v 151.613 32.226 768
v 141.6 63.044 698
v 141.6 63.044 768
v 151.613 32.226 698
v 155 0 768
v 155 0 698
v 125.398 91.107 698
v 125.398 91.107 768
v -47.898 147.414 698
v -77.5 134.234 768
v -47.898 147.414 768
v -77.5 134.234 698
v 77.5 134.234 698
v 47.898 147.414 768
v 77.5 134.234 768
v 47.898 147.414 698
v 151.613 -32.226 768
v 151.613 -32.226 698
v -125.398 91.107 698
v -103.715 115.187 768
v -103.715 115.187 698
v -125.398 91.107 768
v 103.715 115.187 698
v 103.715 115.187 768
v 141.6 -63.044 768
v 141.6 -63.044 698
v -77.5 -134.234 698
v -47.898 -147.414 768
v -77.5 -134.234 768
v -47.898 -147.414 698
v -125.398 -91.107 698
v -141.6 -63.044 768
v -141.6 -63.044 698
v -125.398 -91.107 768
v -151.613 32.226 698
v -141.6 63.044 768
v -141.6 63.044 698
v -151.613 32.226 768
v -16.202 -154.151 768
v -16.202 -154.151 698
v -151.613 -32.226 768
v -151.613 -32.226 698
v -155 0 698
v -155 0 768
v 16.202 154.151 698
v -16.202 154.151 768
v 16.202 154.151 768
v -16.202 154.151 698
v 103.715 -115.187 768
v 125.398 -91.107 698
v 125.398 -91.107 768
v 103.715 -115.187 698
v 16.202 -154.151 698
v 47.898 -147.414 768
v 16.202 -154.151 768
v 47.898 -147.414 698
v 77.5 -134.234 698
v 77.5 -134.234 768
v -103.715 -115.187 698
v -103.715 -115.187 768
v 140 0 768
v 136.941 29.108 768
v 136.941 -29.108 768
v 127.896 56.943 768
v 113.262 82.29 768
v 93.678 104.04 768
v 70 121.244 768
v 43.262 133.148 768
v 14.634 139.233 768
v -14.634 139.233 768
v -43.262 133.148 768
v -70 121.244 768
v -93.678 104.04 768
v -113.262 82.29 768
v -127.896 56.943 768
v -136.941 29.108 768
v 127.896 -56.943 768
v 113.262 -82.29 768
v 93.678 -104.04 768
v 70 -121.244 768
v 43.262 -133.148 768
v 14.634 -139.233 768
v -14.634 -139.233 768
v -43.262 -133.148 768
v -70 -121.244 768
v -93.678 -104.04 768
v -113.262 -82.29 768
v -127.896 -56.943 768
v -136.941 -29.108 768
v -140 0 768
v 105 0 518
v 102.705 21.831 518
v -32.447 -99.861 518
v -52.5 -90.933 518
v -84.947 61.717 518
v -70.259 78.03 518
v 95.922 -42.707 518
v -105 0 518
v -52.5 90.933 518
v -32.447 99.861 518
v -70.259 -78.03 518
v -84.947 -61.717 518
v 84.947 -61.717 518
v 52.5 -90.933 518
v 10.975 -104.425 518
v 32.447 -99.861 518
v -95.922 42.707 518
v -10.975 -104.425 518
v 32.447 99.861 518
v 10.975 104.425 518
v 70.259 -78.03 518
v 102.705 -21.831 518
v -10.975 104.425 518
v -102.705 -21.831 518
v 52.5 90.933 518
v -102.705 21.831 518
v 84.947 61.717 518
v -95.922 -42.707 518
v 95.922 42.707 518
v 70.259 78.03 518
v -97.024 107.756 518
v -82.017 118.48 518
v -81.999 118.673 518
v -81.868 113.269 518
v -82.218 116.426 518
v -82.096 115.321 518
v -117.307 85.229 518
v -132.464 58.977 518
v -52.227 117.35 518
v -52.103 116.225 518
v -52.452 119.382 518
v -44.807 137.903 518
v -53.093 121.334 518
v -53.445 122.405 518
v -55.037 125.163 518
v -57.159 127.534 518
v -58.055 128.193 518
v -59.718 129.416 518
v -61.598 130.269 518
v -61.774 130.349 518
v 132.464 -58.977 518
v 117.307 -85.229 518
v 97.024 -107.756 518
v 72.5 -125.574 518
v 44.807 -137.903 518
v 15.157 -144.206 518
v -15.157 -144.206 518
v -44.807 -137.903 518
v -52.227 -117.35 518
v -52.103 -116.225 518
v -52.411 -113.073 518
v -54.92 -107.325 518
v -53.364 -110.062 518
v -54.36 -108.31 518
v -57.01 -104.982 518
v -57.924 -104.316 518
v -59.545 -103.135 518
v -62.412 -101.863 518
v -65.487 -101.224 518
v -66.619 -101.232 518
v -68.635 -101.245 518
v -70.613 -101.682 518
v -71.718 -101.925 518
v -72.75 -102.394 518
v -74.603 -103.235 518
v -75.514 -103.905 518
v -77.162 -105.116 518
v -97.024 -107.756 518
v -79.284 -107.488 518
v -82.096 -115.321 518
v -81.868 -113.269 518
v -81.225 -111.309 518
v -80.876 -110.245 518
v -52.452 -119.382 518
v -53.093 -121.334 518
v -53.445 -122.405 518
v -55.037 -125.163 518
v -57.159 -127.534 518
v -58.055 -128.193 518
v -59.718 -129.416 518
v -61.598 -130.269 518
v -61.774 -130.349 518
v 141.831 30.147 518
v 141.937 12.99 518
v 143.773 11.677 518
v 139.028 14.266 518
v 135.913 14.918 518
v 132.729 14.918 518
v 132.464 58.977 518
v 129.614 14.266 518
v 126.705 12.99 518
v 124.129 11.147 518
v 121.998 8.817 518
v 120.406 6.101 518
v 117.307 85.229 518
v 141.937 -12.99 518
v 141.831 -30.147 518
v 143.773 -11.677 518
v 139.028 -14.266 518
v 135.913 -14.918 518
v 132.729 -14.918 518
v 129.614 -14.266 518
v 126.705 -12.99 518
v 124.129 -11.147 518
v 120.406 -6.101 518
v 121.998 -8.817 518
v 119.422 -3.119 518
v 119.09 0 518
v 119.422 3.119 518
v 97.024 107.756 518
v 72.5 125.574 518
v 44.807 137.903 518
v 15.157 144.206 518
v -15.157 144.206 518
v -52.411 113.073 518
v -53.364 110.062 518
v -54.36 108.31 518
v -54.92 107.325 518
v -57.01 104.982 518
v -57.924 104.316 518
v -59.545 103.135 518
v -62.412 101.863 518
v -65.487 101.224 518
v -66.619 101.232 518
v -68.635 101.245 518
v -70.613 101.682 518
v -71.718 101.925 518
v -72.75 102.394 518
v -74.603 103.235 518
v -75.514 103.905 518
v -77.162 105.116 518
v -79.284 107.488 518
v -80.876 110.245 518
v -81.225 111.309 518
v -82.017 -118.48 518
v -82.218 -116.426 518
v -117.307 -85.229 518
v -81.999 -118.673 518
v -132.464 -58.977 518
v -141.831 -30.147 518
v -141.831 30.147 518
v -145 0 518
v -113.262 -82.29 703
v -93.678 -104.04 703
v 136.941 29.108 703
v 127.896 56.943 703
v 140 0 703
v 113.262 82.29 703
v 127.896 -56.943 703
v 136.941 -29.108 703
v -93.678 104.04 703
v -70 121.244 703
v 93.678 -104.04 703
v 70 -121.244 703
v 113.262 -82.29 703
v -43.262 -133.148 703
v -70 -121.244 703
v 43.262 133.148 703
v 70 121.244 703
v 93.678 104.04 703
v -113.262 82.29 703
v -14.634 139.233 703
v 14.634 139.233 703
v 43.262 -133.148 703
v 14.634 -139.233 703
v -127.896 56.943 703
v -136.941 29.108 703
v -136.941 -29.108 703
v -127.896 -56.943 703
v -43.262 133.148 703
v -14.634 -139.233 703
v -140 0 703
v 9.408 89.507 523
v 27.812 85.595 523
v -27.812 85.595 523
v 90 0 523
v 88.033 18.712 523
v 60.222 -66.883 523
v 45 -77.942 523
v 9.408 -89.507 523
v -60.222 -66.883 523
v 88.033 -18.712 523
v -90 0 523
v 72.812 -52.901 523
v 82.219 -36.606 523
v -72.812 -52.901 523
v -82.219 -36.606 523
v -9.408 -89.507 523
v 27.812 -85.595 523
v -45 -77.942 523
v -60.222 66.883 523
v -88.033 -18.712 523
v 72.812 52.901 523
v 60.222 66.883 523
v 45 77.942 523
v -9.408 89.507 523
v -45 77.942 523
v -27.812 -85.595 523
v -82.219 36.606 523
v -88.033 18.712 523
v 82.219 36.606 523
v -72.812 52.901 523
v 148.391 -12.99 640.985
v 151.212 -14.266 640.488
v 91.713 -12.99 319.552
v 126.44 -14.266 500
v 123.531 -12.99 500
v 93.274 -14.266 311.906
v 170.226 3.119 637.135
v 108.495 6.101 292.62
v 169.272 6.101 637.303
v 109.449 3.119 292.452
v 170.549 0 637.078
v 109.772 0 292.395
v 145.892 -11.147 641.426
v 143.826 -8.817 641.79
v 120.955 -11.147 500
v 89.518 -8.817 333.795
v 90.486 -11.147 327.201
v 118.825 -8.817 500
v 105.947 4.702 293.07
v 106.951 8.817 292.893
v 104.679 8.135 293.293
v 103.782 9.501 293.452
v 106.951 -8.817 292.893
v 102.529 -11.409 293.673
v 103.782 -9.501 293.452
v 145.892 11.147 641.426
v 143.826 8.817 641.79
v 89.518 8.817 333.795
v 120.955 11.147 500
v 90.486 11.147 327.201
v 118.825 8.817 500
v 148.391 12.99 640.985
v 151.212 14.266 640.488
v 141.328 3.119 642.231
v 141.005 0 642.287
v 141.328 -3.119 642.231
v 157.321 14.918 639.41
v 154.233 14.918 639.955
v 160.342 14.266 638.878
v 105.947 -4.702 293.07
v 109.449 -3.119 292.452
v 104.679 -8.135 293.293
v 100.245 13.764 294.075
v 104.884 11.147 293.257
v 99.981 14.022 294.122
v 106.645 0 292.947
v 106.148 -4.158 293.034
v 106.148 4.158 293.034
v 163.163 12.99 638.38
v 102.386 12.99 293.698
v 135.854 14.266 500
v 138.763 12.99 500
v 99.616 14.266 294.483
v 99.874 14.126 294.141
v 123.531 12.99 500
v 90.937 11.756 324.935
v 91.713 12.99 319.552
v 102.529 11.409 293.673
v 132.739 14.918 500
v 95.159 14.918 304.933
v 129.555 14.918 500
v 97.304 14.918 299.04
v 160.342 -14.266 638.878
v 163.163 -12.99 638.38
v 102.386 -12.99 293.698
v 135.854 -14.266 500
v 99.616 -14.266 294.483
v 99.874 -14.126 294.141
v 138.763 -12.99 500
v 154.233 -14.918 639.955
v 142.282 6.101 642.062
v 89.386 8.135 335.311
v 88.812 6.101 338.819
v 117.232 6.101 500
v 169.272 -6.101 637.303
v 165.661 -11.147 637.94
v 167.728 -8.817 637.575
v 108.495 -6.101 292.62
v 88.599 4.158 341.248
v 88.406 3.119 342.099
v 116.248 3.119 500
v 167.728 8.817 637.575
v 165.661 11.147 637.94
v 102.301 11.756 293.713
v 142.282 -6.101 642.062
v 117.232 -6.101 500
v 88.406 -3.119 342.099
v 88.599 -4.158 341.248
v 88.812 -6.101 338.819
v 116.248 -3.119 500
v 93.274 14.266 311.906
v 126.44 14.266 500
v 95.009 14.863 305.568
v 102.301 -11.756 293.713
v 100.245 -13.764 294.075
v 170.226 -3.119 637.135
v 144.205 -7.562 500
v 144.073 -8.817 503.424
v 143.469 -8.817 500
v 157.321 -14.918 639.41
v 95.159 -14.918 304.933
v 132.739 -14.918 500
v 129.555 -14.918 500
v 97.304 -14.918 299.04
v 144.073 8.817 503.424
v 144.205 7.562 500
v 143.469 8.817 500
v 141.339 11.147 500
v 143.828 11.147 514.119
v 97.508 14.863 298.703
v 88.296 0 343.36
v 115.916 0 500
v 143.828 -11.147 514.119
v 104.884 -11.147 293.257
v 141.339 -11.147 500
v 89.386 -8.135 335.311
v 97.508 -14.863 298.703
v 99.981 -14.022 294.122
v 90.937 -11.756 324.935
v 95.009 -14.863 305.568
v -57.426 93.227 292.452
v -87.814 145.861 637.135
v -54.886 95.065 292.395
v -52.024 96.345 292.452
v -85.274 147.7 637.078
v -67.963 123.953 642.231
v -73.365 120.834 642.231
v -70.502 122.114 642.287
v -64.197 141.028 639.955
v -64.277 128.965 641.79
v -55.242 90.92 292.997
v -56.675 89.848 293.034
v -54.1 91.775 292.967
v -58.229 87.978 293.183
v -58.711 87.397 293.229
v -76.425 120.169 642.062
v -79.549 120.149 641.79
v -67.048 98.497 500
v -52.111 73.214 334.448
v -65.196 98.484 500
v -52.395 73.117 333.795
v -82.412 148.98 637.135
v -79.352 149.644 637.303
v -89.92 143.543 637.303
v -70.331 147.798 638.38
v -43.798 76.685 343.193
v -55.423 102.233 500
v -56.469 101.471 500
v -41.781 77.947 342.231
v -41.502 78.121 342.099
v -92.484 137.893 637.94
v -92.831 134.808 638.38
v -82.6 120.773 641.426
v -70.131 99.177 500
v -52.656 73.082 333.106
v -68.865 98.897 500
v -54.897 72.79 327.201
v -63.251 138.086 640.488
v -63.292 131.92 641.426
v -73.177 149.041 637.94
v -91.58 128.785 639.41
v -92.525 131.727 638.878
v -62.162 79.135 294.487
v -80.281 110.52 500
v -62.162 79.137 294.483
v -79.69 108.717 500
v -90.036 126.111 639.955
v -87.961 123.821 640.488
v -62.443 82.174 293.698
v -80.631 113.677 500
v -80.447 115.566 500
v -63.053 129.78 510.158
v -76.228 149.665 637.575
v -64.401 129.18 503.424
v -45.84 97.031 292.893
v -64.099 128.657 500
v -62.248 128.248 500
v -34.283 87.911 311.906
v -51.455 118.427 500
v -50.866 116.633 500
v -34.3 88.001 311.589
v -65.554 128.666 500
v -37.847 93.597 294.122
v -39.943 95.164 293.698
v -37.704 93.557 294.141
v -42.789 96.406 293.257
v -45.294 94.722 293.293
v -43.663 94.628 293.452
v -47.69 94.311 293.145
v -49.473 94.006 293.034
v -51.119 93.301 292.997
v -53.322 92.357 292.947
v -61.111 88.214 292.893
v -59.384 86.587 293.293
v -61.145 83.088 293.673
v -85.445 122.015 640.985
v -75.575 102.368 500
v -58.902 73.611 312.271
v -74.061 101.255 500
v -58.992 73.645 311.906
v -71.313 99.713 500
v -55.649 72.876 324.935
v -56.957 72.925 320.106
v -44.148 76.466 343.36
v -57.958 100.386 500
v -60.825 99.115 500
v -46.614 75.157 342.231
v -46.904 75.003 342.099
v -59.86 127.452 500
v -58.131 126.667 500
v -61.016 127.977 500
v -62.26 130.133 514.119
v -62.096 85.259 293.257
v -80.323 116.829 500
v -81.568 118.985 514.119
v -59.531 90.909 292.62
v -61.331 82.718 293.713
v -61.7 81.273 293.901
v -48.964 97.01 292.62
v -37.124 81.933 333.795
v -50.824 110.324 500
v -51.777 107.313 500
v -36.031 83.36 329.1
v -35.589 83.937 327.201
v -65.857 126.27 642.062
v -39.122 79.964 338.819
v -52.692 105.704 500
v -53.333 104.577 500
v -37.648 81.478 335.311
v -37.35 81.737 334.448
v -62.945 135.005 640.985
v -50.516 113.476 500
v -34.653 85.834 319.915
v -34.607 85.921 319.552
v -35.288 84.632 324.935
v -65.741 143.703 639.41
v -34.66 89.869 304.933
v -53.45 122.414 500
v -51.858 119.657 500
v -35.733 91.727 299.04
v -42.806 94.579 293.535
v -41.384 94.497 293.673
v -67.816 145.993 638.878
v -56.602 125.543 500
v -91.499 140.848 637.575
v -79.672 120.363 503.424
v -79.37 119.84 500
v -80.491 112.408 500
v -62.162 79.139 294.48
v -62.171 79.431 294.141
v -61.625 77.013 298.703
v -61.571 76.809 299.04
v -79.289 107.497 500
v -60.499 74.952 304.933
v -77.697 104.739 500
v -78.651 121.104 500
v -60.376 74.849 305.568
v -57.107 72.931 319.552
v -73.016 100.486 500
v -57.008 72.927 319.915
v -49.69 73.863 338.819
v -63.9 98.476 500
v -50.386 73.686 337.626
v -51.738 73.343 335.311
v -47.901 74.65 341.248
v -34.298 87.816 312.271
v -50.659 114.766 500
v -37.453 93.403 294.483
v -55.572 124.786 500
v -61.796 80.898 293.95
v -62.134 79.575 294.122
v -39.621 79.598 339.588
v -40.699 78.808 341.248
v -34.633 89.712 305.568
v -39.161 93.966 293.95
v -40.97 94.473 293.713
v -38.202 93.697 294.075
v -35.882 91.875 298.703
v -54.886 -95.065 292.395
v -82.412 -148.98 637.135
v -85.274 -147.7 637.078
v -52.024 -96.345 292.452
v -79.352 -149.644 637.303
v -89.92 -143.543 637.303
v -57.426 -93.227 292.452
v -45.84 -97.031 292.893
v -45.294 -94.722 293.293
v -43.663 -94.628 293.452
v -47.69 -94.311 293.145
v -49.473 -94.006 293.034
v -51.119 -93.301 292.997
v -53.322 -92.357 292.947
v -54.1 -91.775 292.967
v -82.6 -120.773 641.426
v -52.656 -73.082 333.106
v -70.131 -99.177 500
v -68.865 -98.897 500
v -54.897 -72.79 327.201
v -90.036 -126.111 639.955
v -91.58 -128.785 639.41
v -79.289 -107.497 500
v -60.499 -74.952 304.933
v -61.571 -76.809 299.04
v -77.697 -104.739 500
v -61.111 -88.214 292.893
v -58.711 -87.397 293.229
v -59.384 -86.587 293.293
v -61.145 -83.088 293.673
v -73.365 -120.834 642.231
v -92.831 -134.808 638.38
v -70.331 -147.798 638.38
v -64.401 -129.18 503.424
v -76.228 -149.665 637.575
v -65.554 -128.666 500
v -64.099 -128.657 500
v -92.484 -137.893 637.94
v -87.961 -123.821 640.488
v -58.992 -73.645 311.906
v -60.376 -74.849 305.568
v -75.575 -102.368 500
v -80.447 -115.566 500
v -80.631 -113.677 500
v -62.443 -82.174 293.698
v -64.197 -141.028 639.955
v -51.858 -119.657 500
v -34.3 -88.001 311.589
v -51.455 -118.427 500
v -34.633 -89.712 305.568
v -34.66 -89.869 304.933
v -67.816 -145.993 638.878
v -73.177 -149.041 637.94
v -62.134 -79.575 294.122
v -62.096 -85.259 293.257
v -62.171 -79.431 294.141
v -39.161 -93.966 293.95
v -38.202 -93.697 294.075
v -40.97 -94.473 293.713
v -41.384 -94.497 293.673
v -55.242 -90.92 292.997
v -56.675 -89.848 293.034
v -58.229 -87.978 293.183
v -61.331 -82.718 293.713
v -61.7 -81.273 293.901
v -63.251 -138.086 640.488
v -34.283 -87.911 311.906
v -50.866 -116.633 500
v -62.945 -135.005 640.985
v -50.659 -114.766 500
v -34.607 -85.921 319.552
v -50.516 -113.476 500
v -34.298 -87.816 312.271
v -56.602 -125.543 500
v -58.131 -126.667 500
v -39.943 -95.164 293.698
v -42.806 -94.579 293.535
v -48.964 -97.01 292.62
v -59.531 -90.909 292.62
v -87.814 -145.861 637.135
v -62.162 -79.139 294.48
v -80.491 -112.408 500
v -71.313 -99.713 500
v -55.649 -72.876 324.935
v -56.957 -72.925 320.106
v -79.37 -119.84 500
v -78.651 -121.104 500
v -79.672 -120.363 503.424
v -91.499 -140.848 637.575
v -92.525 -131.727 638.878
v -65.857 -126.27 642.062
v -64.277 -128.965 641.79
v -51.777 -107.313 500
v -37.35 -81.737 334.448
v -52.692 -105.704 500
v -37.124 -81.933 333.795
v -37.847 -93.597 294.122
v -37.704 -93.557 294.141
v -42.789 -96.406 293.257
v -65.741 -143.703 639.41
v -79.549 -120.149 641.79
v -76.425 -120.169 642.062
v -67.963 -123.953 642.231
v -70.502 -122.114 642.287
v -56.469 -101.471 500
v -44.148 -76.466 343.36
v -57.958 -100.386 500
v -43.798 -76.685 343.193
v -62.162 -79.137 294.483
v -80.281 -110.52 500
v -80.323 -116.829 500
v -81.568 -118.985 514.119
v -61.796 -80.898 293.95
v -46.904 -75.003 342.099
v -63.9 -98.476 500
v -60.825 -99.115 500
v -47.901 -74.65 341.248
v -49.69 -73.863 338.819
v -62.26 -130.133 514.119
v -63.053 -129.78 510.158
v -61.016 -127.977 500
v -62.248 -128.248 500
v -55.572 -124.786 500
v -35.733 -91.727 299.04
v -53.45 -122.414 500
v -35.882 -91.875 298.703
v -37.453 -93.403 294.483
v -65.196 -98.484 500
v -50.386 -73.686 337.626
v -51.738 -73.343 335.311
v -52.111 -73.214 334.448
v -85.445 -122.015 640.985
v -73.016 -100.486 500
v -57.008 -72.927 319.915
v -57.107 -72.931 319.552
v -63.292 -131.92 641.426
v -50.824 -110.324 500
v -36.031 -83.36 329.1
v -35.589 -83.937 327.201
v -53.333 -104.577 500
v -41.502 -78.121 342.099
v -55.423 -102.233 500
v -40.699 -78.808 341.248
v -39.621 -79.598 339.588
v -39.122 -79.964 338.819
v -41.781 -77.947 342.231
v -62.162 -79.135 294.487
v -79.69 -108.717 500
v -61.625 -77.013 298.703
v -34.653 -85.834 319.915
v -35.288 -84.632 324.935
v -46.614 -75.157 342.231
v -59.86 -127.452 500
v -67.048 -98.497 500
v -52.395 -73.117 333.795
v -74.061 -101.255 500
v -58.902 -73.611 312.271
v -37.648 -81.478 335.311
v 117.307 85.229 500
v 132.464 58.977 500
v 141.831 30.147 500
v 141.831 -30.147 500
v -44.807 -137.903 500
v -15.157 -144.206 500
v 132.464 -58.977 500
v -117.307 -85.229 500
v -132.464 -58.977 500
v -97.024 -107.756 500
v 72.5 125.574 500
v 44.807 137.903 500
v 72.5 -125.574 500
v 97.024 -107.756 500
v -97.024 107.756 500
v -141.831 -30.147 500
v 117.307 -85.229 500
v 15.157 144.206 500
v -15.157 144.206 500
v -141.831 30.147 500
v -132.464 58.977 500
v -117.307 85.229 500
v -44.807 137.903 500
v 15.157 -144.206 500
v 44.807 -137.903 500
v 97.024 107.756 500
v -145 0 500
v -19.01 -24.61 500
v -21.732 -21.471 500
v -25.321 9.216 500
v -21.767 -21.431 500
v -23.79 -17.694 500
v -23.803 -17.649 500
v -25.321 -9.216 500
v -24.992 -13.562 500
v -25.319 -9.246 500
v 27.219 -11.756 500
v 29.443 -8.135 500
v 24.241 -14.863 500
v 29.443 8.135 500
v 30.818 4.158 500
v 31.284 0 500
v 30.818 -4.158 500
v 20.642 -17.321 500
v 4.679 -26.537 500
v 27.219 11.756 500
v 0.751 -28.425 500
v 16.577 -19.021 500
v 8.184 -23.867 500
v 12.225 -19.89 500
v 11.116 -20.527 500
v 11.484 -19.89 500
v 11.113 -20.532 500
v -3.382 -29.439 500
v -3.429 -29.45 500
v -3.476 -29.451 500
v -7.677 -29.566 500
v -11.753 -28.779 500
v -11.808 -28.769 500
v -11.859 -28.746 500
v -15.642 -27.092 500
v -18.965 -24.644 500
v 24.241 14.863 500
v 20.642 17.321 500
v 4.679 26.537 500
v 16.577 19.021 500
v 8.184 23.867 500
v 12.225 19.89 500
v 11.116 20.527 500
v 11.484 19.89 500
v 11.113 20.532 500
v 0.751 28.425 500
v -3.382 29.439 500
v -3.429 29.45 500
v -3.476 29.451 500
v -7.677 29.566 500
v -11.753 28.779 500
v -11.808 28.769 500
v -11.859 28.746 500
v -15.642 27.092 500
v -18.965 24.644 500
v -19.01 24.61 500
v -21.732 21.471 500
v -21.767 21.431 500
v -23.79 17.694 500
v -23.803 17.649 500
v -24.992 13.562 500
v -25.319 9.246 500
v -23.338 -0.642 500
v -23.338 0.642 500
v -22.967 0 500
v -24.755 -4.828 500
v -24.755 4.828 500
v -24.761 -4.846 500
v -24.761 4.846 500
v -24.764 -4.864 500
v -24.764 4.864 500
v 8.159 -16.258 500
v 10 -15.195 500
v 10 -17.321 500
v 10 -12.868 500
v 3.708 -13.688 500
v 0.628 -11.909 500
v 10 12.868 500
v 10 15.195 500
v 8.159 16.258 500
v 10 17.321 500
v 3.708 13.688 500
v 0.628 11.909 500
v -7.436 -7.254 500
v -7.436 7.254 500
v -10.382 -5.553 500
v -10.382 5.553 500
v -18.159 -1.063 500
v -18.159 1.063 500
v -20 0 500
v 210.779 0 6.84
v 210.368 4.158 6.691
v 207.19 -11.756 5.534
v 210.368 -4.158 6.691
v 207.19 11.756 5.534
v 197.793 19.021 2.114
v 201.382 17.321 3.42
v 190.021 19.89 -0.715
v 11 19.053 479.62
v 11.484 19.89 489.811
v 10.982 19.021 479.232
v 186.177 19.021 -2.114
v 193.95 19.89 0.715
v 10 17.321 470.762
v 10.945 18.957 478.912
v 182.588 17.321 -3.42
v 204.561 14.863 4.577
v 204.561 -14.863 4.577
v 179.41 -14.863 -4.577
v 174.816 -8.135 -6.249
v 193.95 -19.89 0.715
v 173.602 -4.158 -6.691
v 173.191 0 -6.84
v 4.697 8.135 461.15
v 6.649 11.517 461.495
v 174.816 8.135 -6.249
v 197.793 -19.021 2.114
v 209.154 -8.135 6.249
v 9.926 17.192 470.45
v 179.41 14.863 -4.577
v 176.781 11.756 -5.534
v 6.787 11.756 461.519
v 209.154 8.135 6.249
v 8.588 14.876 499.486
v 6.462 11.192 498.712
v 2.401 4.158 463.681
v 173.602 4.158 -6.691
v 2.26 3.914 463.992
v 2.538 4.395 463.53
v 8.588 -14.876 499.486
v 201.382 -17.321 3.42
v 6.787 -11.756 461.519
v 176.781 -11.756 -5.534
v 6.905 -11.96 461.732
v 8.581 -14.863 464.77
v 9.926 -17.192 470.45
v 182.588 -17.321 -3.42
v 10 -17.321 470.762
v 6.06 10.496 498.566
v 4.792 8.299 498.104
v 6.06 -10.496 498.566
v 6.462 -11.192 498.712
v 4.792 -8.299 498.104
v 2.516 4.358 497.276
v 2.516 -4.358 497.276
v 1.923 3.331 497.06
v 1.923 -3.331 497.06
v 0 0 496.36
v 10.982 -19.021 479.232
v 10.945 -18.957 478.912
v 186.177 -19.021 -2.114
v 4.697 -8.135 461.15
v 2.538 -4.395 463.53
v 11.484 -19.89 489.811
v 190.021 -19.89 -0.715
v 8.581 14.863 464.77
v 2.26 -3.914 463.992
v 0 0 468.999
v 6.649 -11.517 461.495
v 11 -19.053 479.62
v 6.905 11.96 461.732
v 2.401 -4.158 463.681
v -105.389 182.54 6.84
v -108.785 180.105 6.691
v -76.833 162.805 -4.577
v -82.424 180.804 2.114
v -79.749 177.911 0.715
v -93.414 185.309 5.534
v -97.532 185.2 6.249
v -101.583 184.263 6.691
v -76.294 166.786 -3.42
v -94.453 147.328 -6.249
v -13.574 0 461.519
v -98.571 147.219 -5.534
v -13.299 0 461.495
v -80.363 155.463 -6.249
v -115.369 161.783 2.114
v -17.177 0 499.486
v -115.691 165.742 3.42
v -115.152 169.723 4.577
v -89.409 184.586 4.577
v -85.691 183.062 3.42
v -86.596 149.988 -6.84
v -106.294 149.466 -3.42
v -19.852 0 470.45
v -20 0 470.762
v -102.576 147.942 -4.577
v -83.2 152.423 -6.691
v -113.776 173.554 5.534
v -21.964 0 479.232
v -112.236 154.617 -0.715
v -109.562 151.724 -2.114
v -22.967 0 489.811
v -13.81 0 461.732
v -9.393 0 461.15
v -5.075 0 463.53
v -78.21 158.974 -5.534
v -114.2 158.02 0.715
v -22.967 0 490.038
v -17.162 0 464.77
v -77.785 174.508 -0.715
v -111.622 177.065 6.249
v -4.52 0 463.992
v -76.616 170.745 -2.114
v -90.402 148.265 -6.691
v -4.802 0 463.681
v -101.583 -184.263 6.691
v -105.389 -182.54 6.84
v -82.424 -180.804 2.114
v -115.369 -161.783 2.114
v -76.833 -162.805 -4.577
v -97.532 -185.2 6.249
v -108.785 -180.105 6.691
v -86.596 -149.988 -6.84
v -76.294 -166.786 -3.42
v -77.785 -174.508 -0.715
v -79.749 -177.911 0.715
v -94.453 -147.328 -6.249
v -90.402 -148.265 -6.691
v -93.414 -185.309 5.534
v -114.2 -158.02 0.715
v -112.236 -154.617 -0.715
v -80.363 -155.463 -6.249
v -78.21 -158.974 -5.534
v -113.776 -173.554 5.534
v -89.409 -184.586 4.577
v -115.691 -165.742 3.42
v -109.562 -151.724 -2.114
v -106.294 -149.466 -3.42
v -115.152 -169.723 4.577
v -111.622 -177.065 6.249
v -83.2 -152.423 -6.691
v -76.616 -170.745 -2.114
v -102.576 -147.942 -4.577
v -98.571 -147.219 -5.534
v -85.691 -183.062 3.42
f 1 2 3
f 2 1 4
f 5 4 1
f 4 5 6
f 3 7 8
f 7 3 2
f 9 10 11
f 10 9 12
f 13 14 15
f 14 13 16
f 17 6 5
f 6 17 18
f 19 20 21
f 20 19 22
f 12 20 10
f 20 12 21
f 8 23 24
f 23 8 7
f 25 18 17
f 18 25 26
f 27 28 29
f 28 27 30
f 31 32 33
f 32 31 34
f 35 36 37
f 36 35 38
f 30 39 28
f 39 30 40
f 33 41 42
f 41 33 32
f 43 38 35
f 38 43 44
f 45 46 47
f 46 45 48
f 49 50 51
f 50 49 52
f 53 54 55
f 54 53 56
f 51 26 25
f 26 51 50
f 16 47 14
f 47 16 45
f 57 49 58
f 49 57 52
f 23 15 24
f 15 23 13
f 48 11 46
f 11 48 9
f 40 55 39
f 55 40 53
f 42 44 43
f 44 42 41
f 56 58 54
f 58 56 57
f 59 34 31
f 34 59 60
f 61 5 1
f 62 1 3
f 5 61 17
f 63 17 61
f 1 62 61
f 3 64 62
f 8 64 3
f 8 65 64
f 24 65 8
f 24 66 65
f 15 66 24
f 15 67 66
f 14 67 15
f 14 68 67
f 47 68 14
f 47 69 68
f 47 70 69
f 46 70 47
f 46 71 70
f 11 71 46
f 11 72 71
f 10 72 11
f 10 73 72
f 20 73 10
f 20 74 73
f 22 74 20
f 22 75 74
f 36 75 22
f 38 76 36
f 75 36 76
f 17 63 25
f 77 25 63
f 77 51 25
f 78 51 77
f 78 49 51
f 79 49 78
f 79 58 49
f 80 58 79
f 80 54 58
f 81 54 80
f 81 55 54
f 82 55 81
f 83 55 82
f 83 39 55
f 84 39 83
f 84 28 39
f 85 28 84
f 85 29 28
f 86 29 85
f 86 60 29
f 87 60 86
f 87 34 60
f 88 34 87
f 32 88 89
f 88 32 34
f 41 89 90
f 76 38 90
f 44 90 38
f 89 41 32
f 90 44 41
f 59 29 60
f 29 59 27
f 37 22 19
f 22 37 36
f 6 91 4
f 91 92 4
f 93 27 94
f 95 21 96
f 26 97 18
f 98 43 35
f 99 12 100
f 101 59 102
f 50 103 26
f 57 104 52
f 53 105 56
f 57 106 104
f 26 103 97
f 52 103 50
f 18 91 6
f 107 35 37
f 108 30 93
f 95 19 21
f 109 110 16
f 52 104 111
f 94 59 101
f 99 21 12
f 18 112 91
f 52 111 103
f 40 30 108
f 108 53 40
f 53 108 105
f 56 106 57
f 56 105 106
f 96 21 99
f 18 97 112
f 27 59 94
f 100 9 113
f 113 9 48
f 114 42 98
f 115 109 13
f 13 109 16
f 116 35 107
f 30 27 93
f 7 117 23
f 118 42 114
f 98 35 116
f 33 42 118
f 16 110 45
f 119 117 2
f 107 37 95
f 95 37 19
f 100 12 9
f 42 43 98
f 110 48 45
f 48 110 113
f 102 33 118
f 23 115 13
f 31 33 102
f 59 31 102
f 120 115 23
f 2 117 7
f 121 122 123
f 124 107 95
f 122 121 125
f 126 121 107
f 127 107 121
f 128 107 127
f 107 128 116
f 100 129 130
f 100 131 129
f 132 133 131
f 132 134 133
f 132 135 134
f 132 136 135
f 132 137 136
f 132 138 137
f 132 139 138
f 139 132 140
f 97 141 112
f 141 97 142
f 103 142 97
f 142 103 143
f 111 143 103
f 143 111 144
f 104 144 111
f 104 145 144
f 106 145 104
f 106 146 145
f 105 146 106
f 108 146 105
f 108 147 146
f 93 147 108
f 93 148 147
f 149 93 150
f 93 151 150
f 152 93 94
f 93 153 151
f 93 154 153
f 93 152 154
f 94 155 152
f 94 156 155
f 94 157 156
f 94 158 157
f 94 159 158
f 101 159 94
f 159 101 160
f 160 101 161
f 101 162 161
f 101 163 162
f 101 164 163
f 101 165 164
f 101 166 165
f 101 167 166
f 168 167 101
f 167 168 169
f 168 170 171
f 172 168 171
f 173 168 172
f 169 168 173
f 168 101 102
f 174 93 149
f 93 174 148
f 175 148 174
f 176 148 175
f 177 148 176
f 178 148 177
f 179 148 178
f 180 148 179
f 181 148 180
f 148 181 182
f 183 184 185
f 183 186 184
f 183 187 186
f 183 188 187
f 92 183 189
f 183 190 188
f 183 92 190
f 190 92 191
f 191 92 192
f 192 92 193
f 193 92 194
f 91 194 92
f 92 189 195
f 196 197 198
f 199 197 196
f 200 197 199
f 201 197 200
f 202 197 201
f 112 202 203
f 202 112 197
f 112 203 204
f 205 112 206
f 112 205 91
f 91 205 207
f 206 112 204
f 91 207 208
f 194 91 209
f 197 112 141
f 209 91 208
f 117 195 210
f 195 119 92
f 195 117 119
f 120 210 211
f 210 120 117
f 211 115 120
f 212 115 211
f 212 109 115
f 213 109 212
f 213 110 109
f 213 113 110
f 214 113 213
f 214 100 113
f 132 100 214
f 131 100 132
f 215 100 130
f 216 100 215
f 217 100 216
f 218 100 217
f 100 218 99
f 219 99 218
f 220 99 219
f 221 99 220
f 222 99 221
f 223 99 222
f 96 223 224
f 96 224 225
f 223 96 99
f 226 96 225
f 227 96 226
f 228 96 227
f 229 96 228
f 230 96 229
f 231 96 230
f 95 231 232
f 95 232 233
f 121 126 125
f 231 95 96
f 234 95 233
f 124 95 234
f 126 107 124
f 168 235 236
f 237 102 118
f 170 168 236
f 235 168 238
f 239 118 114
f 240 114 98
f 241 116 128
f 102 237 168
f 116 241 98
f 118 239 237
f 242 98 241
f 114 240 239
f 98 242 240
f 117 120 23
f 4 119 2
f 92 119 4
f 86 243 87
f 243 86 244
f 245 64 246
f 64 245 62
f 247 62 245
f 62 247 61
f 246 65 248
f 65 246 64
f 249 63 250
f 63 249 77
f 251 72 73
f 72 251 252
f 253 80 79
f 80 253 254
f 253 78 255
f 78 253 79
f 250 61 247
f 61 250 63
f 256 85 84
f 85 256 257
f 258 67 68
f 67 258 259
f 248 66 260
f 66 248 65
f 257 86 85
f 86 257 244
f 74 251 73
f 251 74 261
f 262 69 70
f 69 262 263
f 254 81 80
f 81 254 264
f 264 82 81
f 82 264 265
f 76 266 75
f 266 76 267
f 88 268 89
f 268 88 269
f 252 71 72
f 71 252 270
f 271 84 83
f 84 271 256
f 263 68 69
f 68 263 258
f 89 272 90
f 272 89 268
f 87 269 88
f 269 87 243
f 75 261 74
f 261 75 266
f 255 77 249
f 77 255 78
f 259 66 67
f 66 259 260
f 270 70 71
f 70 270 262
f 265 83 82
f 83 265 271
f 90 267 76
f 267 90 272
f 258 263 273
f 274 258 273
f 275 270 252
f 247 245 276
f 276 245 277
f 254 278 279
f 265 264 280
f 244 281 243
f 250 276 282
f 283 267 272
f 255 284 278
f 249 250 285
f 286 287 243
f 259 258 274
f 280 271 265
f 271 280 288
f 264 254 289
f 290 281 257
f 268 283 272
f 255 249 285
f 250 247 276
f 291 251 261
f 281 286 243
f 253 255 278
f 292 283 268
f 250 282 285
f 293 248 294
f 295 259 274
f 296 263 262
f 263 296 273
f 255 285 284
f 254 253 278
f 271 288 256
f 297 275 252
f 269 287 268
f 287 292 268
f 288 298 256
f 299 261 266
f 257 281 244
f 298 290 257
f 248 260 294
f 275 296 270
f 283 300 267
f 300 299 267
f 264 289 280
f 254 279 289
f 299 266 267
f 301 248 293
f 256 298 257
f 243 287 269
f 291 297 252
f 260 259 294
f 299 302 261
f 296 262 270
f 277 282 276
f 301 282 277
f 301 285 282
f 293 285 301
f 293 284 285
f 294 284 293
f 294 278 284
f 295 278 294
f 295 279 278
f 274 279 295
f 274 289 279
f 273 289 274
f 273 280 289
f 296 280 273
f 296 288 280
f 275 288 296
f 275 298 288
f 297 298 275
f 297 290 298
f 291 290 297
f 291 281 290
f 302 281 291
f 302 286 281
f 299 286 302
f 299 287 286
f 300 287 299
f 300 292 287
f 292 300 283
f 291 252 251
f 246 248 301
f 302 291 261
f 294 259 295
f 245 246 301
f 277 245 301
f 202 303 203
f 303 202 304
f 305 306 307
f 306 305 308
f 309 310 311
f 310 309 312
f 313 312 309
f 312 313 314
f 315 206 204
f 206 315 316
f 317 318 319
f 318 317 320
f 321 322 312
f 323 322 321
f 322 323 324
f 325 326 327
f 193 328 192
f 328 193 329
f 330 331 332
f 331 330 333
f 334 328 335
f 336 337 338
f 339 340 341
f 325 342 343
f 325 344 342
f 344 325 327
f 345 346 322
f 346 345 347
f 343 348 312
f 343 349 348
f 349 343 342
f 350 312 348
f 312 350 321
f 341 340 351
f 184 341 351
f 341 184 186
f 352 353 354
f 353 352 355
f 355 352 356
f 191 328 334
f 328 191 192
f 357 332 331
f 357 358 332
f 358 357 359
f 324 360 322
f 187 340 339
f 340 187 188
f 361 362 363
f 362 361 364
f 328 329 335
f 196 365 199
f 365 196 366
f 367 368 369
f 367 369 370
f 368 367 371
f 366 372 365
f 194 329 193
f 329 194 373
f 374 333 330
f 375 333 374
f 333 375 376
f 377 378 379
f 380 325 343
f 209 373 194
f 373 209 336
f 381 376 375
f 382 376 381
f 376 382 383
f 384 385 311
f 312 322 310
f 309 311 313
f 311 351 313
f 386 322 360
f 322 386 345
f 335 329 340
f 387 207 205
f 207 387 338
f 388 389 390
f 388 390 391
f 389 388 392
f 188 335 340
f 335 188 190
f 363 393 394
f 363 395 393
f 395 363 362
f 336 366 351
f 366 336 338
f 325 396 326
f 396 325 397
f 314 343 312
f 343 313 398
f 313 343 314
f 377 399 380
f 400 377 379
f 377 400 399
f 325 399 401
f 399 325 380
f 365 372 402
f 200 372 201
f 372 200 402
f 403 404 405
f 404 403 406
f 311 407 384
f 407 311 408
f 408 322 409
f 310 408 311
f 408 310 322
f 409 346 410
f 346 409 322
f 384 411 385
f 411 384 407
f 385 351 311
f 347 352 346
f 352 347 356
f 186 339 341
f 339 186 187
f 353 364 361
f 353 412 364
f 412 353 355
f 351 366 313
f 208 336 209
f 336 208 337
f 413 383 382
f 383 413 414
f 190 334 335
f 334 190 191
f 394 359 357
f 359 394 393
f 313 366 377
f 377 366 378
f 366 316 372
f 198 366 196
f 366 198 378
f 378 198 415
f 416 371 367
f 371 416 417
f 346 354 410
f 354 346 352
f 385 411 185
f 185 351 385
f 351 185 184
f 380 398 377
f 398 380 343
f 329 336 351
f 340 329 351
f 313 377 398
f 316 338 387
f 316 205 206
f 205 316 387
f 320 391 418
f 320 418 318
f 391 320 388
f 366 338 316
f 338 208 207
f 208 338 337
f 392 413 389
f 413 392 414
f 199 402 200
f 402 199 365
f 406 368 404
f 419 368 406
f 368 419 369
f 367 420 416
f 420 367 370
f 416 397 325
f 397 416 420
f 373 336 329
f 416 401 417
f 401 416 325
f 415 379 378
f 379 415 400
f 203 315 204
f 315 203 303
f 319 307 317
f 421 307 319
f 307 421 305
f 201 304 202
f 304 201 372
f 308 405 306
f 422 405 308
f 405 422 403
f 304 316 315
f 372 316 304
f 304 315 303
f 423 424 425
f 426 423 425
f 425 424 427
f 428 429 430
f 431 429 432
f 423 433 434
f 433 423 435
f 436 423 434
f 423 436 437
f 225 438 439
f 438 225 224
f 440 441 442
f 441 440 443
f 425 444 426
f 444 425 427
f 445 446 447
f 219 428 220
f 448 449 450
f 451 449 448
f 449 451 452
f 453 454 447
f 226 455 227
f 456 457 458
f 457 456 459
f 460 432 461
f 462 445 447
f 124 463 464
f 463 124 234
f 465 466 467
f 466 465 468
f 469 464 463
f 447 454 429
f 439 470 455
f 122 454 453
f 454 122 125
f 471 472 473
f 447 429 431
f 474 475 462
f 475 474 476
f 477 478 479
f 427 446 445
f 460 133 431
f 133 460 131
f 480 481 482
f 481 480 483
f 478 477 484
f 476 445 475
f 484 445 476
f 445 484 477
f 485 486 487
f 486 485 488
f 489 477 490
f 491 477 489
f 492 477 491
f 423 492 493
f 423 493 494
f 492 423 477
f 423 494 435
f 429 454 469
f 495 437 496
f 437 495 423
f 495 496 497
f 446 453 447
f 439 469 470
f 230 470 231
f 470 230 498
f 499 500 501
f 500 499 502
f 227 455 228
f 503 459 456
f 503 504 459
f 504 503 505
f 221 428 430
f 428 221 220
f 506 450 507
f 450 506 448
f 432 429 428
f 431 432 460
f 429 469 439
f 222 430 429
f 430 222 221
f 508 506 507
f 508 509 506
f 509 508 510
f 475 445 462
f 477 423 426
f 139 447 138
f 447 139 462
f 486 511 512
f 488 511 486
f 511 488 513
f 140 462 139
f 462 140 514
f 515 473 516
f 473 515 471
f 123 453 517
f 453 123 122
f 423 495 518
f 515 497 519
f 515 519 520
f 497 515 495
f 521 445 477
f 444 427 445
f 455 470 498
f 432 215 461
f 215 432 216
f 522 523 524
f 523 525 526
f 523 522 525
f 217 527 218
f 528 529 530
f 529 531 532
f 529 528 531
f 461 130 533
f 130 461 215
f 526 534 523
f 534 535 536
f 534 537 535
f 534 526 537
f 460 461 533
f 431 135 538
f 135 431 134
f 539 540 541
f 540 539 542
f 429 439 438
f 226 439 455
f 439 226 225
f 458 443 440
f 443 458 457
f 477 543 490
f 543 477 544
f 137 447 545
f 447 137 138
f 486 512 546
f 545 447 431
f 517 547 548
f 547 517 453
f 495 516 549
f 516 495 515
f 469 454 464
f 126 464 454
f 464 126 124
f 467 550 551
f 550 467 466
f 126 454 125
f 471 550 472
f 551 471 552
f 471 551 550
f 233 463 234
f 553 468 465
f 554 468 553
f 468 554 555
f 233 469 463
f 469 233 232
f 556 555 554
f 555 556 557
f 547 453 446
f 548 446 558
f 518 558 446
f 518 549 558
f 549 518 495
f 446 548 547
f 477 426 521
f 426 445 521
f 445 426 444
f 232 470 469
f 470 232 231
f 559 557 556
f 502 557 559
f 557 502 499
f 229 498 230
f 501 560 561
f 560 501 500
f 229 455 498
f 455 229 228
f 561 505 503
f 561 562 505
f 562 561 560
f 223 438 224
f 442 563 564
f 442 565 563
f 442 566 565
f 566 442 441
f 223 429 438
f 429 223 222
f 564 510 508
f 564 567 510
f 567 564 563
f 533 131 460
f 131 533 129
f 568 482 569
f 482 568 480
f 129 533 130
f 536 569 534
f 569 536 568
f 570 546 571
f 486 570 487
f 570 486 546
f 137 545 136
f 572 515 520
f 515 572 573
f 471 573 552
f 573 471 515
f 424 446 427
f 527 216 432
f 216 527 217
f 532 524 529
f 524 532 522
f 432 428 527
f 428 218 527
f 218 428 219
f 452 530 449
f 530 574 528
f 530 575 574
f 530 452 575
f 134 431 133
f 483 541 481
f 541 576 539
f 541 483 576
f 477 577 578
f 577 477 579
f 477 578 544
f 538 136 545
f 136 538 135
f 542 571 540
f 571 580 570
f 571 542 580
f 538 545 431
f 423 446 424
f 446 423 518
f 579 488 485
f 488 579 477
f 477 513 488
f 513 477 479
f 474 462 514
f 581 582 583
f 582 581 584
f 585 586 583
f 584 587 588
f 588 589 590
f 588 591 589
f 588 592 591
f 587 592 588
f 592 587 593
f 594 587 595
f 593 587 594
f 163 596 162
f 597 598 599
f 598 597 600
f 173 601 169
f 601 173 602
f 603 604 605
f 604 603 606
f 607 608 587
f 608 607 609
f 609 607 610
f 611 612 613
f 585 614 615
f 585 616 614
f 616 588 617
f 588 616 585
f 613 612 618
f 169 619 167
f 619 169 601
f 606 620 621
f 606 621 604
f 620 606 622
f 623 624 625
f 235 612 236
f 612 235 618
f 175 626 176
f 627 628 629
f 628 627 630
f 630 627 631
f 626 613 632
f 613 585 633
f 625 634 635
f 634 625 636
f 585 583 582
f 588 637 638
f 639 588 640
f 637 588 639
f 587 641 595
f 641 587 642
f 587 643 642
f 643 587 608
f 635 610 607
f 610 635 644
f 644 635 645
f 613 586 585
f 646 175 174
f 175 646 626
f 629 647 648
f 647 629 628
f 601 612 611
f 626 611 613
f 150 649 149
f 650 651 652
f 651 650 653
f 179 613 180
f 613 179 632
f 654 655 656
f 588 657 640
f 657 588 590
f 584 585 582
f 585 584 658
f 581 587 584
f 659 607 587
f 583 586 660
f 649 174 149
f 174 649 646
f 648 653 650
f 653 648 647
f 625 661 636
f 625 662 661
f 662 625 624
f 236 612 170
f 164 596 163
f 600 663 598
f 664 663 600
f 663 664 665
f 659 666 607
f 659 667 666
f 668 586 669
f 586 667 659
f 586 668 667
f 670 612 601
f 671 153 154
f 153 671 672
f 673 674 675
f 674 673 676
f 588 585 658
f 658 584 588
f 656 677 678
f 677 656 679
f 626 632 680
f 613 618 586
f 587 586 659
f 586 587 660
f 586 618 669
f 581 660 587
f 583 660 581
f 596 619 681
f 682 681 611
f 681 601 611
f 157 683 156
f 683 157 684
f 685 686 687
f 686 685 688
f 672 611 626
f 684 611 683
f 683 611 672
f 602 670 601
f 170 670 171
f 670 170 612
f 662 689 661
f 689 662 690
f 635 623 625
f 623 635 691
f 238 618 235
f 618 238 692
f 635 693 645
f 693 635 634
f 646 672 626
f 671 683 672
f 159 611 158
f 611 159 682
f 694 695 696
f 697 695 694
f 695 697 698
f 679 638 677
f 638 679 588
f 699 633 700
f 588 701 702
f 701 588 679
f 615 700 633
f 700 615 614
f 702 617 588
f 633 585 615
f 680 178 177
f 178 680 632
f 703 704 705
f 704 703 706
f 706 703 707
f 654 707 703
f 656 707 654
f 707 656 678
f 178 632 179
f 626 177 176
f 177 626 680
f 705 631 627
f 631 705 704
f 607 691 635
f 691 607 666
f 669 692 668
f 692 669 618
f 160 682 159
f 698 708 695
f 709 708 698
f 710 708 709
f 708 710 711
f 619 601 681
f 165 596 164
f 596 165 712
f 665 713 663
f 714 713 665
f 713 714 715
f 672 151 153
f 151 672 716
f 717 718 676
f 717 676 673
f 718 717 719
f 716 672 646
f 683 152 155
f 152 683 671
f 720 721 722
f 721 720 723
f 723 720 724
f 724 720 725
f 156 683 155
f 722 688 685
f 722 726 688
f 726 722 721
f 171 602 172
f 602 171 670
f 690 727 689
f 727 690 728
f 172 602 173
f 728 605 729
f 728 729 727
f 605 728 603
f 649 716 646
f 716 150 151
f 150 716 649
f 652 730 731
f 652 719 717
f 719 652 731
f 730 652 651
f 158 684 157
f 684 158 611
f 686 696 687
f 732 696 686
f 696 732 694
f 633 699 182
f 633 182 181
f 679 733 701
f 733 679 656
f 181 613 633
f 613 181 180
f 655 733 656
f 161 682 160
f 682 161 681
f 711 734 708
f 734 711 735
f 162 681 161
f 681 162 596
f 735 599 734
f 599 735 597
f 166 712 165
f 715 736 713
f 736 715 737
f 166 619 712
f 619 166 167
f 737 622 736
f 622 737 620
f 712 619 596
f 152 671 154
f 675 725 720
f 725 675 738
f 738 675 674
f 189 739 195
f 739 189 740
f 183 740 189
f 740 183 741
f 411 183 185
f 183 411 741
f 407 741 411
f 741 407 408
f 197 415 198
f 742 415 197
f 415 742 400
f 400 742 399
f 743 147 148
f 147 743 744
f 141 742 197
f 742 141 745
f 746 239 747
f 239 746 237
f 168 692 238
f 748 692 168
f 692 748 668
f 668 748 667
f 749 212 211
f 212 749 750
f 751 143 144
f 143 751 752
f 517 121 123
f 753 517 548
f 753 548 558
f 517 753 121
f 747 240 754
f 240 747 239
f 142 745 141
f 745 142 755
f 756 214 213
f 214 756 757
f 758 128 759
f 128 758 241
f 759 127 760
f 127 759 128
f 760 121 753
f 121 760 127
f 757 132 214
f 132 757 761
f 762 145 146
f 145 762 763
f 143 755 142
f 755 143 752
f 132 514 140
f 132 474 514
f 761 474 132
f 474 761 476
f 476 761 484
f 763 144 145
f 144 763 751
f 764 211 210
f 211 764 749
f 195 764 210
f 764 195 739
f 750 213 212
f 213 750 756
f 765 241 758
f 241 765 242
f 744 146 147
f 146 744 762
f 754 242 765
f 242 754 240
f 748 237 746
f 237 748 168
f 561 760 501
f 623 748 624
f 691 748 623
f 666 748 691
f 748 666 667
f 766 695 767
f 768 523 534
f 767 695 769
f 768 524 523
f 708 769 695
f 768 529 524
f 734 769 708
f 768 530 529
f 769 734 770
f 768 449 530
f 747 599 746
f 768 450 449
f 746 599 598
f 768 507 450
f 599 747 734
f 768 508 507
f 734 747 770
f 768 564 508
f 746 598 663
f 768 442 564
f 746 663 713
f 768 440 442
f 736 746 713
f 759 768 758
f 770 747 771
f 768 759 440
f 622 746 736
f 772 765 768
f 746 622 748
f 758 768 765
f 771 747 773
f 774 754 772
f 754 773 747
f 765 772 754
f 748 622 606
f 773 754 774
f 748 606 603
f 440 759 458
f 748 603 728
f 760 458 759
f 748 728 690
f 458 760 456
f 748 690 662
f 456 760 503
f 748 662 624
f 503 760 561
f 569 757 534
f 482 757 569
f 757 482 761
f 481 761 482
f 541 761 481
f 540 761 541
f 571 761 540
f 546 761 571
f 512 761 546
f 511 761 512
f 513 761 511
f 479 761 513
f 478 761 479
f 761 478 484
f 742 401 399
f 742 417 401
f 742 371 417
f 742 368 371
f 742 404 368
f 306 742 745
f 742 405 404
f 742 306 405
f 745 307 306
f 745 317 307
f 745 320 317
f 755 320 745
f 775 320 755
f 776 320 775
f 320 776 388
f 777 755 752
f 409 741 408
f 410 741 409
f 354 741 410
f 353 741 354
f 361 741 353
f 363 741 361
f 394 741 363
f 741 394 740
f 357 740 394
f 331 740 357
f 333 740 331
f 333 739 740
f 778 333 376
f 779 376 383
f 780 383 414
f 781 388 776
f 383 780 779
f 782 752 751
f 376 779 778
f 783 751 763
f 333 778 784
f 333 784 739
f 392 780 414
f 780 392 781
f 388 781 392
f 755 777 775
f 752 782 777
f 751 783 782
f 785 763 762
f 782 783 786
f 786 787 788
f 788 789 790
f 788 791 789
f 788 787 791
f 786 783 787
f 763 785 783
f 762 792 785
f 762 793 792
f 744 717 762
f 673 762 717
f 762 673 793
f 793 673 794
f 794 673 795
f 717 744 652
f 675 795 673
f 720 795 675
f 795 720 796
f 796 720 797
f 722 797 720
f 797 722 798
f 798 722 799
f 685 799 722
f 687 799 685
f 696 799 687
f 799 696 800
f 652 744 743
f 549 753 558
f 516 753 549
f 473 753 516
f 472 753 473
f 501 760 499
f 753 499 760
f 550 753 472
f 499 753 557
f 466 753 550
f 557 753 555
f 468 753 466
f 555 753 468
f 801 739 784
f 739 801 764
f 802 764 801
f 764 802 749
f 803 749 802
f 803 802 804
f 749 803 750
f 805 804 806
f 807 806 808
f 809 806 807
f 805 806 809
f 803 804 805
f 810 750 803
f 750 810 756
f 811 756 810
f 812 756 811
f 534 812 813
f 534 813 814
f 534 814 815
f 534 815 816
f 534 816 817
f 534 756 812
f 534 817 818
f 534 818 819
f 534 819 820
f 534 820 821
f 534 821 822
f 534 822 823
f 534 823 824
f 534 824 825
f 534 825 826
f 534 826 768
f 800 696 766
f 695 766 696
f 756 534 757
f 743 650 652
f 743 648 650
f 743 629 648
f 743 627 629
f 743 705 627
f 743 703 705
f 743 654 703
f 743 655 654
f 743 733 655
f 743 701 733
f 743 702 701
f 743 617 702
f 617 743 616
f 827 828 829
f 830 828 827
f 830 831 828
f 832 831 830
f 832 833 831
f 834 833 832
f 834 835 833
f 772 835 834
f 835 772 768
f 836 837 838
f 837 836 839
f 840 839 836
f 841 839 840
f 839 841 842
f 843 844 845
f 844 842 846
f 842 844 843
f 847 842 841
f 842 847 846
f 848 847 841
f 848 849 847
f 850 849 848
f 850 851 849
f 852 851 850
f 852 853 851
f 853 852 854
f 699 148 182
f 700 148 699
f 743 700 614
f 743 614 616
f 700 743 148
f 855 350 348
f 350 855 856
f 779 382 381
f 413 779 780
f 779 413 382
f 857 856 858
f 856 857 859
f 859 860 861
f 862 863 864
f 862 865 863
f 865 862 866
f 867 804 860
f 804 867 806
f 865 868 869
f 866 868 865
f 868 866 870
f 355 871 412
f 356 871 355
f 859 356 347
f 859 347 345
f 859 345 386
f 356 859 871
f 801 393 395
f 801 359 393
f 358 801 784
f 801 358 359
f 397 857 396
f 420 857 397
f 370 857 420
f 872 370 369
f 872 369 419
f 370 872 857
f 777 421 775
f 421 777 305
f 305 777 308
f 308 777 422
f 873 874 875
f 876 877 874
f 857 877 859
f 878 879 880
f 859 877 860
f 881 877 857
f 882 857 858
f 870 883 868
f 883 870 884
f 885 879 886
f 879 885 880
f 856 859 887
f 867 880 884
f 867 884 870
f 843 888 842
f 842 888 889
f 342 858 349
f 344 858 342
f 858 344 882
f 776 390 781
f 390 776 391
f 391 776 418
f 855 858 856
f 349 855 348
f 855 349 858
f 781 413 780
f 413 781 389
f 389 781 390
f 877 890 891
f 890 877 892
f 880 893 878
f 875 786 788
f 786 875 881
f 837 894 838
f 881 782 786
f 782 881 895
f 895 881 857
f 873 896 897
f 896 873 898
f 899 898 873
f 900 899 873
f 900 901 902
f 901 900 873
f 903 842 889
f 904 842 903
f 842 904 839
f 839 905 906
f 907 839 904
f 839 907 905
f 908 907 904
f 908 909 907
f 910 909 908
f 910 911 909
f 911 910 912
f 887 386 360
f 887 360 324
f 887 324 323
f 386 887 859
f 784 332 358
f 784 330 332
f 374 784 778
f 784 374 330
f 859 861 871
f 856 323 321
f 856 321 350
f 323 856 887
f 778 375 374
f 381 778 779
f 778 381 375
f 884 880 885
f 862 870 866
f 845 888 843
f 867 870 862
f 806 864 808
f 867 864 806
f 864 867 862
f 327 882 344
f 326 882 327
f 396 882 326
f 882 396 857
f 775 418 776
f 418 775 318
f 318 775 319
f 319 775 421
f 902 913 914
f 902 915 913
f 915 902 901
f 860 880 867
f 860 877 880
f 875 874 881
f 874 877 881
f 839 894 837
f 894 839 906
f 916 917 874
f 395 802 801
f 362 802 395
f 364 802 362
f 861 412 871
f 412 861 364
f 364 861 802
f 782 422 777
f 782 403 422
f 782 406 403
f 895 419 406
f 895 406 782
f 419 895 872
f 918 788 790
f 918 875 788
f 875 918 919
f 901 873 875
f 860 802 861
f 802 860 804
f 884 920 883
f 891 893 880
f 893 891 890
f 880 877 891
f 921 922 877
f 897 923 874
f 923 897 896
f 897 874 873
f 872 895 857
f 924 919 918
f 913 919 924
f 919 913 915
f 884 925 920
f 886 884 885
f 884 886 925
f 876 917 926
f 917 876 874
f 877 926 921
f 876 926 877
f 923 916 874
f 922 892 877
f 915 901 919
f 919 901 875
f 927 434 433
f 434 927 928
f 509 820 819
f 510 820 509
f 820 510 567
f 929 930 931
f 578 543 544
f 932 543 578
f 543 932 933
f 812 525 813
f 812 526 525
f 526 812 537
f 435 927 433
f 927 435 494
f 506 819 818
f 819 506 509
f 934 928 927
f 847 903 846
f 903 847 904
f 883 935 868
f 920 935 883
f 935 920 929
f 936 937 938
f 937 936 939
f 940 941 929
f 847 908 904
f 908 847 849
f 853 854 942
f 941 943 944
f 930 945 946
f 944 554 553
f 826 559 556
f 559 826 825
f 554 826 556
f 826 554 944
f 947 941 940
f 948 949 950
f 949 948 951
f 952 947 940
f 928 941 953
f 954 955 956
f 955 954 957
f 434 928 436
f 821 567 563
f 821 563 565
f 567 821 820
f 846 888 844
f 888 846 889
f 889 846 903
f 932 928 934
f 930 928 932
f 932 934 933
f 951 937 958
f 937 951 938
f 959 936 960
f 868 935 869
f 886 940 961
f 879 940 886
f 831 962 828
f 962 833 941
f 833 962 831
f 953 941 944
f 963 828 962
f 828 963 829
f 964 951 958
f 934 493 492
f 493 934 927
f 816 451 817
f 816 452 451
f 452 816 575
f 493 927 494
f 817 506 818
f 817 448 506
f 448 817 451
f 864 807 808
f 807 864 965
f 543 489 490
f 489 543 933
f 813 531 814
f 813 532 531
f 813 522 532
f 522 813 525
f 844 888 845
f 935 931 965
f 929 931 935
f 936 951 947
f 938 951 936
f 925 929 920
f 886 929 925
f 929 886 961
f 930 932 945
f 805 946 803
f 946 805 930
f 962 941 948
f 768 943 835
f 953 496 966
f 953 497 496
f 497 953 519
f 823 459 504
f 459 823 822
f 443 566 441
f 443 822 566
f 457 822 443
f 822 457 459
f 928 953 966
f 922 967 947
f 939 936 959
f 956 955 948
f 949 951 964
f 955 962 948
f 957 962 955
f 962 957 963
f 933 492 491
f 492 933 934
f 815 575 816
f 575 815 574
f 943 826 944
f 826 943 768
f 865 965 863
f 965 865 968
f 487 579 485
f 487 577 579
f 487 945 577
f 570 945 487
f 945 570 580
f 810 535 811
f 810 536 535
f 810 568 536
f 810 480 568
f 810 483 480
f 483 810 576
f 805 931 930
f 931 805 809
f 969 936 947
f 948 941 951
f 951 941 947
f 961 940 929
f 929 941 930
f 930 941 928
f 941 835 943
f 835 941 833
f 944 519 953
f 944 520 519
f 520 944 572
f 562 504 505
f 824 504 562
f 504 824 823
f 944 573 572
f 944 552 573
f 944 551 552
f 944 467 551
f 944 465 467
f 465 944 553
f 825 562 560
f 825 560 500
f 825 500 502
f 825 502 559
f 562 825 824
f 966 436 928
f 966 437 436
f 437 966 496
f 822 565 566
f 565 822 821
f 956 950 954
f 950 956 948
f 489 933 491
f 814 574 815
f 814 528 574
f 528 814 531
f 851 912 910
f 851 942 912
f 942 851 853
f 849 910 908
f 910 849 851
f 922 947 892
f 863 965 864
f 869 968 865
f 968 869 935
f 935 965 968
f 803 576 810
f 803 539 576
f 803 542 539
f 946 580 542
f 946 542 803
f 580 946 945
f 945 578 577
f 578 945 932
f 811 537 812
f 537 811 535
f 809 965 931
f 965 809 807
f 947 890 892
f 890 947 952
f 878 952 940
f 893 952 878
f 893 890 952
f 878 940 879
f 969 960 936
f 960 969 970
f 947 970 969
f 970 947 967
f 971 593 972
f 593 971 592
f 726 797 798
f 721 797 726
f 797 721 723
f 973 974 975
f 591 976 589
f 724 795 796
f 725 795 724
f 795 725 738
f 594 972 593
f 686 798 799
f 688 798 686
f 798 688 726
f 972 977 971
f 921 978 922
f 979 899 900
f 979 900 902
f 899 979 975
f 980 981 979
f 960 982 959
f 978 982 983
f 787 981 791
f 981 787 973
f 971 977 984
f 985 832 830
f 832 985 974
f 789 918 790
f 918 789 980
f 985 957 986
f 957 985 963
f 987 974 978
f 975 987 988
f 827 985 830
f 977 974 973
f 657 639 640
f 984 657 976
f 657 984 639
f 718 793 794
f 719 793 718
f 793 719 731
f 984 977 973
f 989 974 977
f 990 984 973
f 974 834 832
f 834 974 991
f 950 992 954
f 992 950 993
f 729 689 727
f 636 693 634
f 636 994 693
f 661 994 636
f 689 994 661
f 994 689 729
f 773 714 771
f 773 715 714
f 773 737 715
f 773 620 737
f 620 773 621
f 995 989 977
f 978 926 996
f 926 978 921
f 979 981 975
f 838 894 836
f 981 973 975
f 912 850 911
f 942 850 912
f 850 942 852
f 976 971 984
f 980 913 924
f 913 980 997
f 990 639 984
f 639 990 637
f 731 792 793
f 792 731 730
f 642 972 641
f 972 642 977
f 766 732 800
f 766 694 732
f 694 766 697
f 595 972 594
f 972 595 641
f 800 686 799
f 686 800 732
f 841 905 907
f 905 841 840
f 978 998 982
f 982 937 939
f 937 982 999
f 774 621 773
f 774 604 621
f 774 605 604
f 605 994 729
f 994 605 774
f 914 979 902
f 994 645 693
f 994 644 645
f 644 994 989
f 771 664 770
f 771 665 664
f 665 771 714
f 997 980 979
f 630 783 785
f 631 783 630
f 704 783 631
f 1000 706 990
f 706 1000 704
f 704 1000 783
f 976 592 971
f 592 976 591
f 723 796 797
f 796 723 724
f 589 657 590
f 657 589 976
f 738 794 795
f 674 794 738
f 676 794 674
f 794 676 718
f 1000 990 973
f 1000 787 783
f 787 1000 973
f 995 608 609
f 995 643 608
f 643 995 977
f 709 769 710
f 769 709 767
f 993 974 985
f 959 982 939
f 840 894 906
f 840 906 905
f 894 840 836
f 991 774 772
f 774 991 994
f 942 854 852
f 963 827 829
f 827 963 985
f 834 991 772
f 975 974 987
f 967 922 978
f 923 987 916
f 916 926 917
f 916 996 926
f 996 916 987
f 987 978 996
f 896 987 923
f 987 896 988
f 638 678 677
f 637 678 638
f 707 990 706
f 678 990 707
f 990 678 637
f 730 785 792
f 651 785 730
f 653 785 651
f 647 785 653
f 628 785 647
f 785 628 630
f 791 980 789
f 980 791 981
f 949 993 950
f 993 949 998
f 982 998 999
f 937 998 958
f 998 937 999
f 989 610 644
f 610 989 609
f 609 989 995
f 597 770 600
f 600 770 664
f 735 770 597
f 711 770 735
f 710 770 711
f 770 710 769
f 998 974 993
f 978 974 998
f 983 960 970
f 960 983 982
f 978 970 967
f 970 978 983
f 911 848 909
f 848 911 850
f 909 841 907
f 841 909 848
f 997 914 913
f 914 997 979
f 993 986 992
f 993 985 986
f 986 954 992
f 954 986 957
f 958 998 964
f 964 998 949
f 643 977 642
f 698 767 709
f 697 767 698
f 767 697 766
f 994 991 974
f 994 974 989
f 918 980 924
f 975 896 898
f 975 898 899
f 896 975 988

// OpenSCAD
base_t = 18;
base_d = 290;

legs_h = 500;
legs_w = 120;
legs_d = 40; 

legs_a = 20;
legs_l = legs_h/cos(legs_a);
legs_bottom_w = tan(legs_a)*legs_h;
echo(legs_a);
echo(legs_l);
echo(legs_bottom_w);

cylinder_rad = legs_w/2-15;
top_rad = 200;

module leg(x,y, a) {
    rotate([0, 0, a]) {
        translate([x,y,0]){
            rotate([0, -legs_a, 0]) {
                cylinder(h=legs_l, d=legs_d);
            }
        }
    }
}

module arm(a) {
    arm_l = 350;
    arm_d = 30;
    arm_a = 10;
    
    d_base_joint_vertical = 200;
    d_center_leg_joint_horizontal = sin(legs_a)*d_base_joint_vertical;
    echo(d_center_leg_joint_horizontal);
    
    rotate([0, 0, a]) {
        translate([base_d/2-50,0,legs_h-arm_l/2-30]){
            rotate([0, arm_a, 0]) {
                cylinder(h=arm_l, d=arm_d);
            }
        }
    }
}

arm(0);
arm(360/3);
arm(360*(2/3));

//base
translate([0,0, legs_h]){
    cylinder(h=base_t, d=base_d);
}


e=10;
leg(legs_bottom_w+e, 0, 0);
leg(legs_bottom_w+e, 0, 360/3);
leg(legs_bottom_w+e, 0, 360*(2/3));





module grey_palm_vase() {
    //d=26
    //d_bot = 21
    //h=25
    //flat = 7
    
    h_horizontal_area = 70;
    h_angled_area = 180;
    r_bottom = 105;
    r_top = 155;
    
    module v(r_bottom) {
        translate([0,0,h_angled_area/2+h_horizontal_area/2]){
            cylinder(h=h_horizontal_area, r=r_bottom+50, center=true);
        }
        cylinder(h=h_angled_area, r1=r_bottom, r2=r_bottom+50, center=true);
    }
    
    translate([0,0,180/2]){
        color("DarkGray"){
            difference(){
              v(105);
              translate([0,0,5]){
                v(90);
              }
            }
        }
    }
}

translate([0,0,legs_h+base_t+0]){
grey_palm_vase();
}
